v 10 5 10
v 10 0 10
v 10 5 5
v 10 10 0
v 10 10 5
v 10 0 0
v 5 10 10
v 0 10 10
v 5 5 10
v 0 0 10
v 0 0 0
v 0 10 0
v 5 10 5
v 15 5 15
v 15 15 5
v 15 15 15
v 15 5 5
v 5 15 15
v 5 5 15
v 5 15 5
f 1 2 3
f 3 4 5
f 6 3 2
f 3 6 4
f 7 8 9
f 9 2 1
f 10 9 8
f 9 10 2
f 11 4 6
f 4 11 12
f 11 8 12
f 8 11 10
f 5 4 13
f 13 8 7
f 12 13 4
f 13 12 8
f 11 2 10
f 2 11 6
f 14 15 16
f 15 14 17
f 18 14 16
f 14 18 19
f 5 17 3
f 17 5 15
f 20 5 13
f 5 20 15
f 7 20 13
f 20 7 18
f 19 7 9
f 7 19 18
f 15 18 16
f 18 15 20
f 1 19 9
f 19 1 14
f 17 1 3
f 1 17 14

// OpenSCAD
union() {
    cube([10, 10, 10]);
    translate([5, 5, 5]) cube([10, 10, 10]);
}
